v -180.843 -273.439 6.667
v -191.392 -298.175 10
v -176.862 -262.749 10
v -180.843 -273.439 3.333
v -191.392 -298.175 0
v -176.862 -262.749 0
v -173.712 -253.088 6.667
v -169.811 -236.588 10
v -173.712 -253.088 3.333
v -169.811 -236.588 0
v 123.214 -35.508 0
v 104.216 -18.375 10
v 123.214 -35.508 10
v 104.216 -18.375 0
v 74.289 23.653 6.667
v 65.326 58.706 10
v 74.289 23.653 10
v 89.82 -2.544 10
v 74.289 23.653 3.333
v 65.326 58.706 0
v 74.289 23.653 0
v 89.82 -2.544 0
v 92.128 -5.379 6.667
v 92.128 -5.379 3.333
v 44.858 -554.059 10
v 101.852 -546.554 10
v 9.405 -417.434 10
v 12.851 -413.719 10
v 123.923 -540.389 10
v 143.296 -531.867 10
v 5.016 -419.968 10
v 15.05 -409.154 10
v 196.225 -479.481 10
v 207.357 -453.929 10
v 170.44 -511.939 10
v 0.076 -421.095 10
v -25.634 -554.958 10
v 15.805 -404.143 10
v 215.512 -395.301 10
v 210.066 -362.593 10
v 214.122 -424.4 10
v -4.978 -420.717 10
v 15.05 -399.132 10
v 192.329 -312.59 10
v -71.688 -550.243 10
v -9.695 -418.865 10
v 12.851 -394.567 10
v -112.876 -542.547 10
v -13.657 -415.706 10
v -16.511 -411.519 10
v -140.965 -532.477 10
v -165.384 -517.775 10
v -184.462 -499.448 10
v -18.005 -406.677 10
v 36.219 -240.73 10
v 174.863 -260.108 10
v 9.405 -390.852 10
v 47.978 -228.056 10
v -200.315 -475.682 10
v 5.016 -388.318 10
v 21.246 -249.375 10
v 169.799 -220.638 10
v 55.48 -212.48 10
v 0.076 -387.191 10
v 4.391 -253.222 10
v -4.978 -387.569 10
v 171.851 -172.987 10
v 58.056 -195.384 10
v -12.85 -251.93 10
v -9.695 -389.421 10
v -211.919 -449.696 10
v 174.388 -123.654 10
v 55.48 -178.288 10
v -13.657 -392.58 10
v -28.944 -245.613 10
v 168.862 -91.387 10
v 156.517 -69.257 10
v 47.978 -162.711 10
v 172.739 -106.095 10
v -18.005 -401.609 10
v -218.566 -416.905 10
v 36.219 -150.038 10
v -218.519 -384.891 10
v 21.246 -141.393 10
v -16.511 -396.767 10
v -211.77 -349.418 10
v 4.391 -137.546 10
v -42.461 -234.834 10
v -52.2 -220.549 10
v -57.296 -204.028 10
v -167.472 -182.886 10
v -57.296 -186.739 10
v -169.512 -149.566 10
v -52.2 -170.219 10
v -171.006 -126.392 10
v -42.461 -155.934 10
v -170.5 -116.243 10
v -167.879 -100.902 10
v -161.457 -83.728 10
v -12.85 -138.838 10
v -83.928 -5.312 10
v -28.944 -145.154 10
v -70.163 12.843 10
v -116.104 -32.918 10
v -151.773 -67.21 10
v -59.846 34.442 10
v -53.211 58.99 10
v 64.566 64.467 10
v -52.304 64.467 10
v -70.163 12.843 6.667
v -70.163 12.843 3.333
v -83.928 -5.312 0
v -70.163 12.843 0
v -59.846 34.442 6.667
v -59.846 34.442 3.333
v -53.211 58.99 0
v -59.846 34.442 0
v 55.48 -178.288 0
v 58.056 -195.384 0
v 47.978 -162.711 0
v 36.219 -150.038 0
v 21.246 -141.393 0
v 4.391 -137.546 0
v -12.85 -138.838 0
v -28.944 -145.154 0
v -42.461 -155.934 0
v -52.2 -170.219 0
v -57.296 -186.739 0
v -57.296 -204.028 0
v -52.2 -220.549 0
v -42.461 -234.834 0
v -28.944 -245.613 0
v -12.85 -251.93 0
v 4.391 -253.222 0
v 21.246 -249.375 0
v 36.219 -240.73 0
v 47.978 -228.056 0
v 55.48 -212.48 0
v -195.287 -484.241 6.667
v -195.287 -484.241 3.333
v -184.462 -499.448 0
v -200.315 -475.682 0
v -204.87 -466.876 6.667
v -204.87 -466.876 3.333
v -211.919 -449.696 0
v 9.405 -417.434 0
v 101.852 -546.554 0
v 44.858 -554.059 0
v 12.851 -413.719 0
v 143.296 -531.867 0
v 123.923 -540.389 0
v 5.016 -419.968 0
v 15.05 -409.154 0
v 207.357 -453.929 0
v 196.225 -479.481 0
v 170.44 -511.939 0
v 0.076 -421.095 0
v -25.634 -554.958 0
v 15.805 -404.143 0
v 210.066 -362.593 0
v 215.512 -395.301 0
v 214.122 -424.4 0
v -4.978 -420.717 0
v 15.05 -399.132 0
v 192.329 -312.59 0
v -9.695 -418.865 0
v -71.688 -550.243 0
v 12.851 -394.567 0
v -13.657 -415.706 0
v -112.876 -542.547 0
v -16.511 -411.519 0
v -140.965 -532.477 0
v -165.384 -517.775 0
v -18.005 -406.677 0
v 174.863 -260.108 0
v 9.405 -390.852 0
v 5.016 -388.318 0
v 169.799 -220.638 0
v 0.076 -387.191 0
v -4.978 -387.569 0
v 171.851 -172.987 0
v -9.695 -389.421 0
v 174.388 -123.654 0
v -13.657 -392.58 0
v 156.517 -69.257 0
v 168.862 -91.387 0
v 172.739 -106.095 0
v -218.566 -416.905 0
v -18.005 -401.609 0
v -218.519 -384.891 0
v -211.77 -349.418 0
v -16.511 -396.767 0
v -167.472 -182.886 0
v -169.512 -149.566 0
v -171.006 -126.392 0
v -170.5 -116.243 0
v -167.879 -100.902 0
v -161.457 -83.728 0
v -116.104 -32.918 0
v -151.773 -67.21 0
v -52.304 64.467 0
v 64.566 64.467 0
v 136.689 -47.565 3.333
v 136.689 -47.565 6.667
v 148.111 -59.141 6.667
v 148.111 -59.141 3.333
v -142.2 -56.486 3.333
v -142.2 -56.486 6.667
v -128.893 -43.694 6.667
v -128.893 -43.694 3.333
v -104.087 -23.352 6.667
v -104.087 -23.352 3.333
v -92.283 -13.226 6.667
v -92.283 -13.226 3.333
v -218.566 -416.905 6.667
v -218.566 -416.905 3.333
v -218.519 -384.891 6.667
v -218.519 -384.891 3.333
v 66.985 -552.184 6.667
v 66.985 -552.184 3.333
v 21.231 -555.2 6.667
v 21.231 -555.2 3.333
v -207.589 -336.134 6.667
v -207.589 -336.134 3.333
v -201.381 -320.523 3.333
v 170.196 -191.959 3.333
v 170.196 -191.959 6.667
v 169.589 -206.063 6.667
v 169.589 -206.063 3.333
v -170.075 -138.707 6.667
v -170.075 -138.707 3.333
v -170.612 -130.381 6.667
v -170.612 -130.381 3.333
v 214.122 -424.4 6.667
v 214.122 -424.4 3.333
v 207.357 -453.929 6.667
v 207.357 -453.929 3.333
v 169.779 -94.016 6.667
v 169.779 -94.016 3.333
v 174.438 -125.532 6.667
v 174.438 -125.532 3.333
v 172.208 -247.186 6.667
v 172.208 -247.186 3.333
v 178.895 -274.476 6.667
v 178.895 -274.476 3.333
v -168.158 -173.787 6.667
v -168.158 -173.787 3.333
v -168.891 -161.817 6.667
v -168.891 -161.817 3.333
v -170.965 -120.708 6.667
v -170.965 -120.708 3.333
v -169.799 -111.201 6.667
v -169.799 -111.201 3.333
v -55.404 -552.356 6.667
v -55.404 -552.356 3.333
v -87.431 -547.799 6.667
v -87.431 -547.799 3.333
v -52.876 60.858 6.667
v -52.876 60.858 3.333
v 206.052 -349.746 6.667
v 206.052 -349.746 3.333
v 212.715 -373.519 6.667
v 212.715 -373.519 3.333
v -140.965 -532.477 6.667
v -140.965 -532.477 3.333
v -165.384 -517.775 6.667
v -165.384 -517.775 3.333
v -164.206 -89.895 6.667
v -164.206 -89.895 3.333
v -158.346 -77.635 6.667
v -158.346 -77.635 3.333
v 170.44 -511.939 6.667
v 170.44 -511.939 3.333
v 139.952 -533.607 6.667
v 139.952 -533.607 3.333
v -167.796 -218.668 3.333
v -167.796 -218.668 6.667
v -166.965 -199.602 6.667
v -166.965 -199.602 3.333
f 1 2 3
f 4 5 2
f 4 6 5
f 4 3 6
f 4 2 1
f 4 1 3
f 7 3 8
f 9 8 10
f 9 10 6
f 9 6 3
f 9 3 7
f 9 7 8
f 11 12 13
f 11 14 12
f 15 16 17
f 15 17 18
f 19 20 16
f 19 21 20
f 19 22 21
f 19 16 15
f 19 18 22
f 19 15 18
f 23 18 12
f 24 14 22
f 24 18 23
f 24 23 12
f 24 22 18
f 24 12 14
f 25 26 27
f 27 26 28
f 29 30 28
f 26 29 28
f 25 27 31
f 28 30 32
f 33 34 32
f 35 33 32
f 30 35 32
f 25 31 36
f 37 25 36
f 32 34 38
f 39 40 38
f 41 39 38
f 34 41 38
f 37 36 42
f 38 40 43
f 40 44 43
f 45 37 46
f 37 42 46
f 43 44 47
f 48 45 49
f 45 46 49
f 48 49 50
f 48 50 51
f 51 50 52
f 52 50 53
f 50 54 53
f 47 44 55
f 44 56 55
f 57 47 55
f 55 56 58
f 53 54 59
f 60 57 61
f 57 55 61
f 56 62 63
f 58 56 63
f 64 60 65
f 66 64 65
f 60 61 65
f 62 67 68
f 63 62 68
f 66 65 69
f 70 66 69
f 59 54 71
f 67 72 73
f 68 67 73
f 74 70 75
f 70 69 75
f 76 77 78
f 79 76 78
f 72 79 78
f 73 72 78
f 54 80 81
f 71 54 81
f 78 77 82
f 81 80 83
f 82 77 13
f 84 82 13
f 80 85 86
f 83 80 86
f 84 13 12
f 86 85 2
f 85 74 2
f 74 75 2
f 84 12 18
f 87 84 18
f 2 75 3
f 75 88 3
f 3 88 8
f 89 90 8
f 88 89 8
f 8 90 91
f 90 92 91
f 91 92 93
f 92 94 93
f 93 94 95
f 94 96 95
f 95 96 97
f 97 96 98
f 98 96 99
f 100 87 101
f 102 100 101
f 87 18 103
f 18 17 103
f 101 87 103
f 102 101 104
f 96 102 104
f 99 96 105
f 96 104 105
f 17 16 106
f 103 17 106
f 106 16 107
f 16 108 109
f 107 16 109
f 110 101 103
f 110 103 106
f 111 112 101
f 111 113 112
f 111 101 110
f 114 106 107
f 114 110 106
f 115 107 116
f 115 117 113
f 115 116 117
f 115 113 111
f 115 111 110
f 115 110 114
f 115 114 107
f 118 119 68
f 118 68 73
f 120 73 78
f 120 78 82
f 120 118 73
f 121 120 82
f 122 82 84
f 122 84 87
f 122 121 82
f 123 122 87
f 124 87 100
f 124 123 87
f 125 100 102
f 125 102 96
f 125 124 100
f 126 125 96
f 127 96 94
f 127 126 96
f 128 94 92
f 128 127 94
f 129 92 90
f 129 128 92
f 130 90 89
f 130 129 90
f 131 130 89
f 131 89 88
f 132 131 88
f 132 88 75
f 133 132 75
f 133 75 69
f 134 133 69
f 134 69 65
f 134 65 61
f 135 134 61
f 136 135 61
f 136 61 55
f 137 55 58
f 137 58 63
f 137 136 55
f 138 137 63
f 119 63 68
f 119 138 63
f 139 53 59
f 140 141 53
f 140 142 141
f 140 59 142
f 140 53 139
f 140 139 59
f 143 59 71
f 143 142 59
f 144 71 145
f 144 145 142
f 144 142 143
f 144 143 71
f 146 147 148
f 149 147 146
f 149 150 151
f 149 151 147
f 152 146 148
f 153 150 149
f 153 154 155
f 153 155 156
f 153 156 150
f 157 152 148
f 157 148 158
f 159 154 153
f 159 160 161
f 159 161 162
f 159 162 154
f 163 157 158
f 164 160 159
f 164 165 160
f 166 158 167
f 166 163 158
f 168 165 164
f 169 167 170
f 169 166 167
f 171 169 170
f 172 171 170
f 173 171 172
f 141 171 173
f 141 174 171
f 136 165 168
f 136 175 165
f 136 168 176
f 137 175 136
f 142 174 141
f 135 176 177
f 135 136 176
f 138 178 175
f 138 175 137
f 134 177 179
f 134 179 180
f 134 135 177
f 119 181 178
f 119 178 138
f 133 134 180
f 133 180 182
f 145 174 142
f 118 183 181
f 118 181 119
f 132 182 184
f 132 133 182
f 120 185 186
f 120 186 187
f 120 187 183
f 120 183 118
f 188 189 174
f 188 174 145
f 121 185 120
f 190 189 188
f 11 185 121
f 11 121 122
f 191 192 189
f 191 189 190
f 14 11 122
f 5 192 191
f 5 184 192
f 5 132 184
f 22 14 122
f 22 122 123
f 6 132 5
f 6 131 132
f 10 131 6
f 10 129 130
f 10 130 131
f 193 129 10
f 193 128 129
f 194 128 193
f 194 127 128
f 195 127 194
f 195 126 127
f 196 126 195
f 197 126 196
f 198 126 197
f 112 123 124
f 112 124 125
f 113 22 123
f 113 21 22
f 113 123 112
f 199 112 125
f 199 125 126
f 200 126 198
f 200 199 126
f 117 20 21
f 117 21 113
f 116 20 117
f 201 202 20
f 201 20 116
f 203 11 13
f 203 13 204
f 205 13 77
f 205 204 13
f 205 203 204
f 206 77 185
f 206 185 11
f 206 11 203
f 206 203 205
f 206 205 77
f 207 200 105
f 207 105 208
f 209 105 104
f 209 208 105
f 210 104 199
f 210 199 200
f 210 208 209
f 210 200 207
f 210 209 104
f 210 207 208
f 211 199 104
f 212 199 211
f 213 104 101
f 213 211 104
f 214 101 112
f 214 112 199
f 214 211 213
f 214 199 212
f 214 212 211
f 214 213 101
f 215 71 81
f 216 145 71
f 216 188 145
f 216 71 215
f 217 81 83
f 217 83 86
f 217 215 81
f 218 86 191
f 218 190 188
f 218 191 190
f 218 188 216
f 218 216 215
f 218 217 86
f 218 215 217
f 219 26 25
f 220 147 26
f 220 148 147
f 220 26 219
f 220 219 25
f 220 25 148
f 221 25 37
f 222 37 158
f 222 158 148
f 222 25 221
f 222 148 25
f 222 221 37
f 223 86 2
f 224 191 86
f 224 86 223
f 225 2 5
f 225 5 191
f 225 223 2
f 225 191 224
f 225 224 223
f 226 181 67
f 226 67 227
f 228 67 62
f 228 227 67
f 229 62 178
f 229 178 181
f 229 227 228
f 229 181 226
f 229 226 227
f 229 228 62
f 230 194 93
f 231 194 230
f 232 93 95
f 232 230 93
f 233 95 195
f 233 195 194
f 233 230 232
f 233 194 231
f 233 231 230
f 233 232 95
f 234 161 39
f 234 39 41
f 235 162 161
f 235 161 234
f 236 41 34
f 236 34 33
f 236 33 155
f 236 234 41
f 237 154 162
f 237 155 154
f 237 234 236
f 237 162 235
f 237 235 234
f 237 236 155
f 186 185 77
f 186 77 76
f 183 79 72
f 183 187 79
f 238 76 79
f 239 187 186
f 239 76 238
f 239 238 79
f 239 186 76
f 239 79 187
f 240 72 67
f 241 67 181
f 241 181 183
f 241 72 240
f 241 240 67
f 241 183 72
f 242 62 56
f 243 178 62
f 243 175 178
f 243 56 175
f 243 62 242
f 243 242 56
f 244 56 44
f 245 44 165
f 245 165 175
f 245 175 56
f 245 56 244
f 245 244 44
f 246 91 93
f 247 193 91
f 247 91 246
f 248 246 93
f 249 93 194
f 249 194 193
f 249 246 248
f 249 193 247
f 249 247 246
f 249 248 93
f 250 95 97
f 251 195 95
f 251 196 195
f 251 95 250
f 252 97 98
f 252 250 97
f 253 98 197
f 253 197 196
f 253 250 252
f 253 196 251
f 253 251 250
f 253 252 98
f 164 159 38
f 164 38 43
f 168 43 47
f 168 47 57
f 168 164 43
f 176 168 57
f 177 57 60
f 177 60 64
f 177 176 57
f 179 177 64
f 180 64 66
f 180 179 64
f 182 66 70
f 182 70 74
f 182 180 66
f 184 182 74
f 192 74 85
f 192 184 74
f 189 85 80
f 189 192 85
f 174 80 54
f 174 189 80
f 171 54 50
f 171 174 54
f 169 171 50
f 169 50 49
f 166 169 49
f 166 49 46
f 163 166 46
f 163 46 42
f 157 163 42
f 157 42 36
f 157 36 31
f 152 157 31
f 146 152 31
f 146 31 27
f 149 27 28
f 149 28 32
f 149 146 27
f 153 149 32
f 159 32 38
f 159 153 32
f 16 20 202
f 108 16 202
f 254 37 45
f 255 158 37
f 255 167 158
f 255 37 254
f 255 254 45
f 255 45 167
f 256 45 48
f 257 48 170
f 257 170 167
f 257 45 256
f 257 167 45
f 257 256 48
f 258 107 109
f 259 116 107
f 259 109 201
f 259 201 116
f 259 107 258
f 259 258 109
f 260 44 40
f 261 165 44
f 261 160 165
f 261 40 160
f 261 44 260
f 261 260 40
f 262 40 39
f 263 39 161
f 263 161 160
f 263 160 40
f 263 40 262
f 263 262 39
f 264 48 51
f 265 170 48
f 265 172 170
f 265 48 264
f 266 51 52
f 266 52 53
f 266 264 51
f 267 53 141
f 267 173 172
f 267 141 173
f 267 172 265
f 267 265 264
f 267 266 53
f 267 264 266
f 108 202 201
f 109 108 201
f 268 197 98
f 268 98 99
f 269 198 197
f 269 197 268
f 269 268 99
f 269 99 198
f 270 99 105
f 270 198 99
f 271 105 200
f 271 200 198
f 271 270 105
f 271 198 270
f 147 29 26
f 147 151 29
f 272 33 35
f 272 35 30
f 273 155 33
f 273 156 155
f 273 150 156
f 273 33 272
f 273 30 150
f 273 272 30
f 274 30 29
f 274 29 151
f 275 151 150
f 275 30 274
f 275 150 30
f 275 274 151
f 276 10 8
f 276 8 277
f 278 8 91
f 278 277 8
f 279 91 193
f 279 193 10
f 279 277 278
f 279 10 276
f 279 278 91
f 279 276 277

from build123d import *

# Parameters (mm, degrees)
F0_R     = 17
F0_R_2   = 58
F1_DEPTH = 10


with BuildPart() as f1:
    # F0 (on Top) → F1 (new body)
    with BuildSketch(Plane.XY):
        with BuildLine():
            add(Edge.make_bspline(
                [(-25.6339077997, -554.9584652973), (-51.3281857013, -553.7520074813), (-93.6695279871, -547.7281922836), (-112.8758760553, -542.5469908858)],
                knots=[0, 0, 0, 0, 1, 1, 1, 1], degree=3))
            add(Edge.make_bspline(
                [(101.8517638204, -546.5538520712), (75.6875139287, -553.2760310818), (18.5277424792, -557.0443555931), (-25.6339077997, -554.9584652973)],
                knots=[0, 0, 0, 0, 1, 1, 1, 1], degree=3))
            add(Edge.make_bspline(
                [(196.2248278388, -479.4811160712), (171.822081153, -518.0226613149), (144.728786774, -537.2783267828), (101.8517638204, -546.5538520712)],
                knots=[0, 0, 0, 0, 1, 1, 1, 1], degree=3))
            add(Edge.make_bspline(
                [(215.5120574316, -395.3010671859), (217.1466194612, -422.7158916841), (209.2029400354, -457.3865119018), (196.2248278388, -479.4811160712)],
                knots=[0, 0, 0, 0, 1, 1, 1, 1], degree=3))
            add(Edge.make_bspline(
                [(192.3294851646, -312.5904306206), (210.6460825929, -360.2347591492), (213.5839387817, -370.7164733528), (215.5120574316, -395.3010671859)],
                knots=[0, 0, 0, 0, 1, 1, 1, 1], degree=3))
            add(Edge.make_bspline(
                [(169.7994317014, -220.6377759274), (170.8927200615, -250.1742175661), (174.6979485759, -265.704673421), (192.3294851646, -312.5904306206)],
                knots=[0, 0, 0, 0, 1, 1, 1, 1], degree=3))
            add(Edge.make_bspline(
                [(171.8513537255, -172.9866951147), (169.5959356869, -196.170976202), (169.2566540986, -204.0498641717), (169.7994317014, -220.6377759274)],
                knots=[0, 0, 0, 0, 1, 1, 1, 1], degree=3))
            add(Edge.make_bspline(
                [(156.5171346692, -69.2568868796), (174.5323214434, -93.697017447), (177.6080524724, -114.5030664178), (171.8513537255, -172.9866951147)],
                knots=[0, 0, 0, 0, 1, 1, 1, 1], degree=3))
            add(Edge.make_bspline(
                [(123.2144497533, -35.5076734554), (137.3923515164, -47.479706869), (149.9416092694, -60.1972288193), (156.5171346692, -69.2568868796)],
                knots=[0, 0, 0, 0, 1, 1, 1, 1], degree=3))
            add(Edge.make_bspline(
                [(65.3255478686, 58.7055848673), (71.3094857176, 18.2698117865), (84.0455293395, -2.4578782981), (123.2144497533, -35.5076734554)],
                knots=[0, 0, 0, 0, 1, 1, 1, 1], degree=3))
            Line((65.3255478686, 58.7055848673), (64.565721553, 64.4665316539))
            Line((64.565721553, 64.4665316539), (-52.3039117597, 64.4665316539))
            add(Edge.make_bspline(
                [(-53.2111279718, 58.9898998943), (-52.85822859, 60.9062352781), (-52.5589473666, 62.6516212459), (-52.3039117597, 64.4665316539)],
                knots=[0, 0, 0, 0, 0.1687767432, 0.1687767432, 0.1687767432, 0.1687767432], degree=3))
            add(Edge.make_bspline(
                [(-83.9275562826, -5.3117870477), (-68.5191745861, 10.9552480289), (-57.925205972, 33.1326502537), (-53.2111279718, 58.9898998943)],
                knots=[0, 0, 0, 0, 1, 1, 1, 1], degree=3))
            add(Edge.make_bspline(
                [(-116.1044629089, -32.9178178076), (-105.0576364154, -24.5577063166), (-89.4816840216, -11.1943914798), (-83.9275562826, -5.3117870477)],
                knots=[0, 0, 0, 0, 1, 1, 1, 1], degree=3))
            add(Edge.make_bspline(
                [(-151.7732536447, -67.2104688142), (-145.4823496584, -58.8826067666), (-127.2181132715, -41.3230190468), (-116.1044629089, -32.9178178076)],
                knots=[0, 0, 0, 0, 1, 1, 1, 1], degree=3))
            add(Edge.make_bspline(
                [(-167.8786038958, -100.9023919243), (-165.7922728196, -91.5504220926), (-158.2096647421, -75.6878301404), (-151.7732536447, -67.2104688142)],
                knots=[0, 0, 0, 0, 1, 1, 1, 1], degree=3))
            add(Edge.make_bspline(
                [(-171.0060882933, -126.3918295099), (-171.6524429426, -123.6316115462), (-170.0516423645, -110.5848282174), (-167.8786038958, -100.9023919243)],
                knots=[0, 0, 0, 0, 1, 1, 1, 1], degree=3))
            add(Edge.make_bspline(
                [(-169.5117163, -149.5662211718), (-170.0493651796, -138.0408590498), (-170.7218331806, -127.612381277), (-171.0060882933, -126.3918295099)],
                knots=[0, 0, 0, 0, 1, 1, 1, 1], degree=3))
            add(Edge.make_bspline(
                [(-167.471540599, -182.8861909723), (-168.0820735931, -176.0867543832), (-169.0001494598, -161.0927678386), (-169.5117163, -149.5662211718)],
                knots=[0, 0, 0, 0, 1, 1, 1, 1], degree=3))
            add(Edge.make_bspline(
                [(-169.8114988663, -236.5880074419), (-167.2539474938, -220.4051955184), (-166.2455341108, -197.26217001), (-167.471540599, -182.8861909723)],
                knots=[0, 0, 0, 0, 1, 1, 1, 1], degree=3))
            add(Edge.make_bspline(
                [(-191.3924597661, -298.1748905383), (-179.0718659588, -271.0675724162), (-172.1596309655, -251.3416179851), (-169.8114988663, -236.5880074419)],
                knots=[0, 0, 0, 0, 1, 1, 1, 1], degree=3))
            add(Edge.make_bspline(
                [(-211.7698147273, -349.4178452311), (-208.0178282467, -335.8281697152), (-203.8558661958, -325.3620944905), (-191.3924597661, -298.1748905383)],
                knots=[0, 0, 0, 0, 1, 1, 1, 1], degree=3))
            add(Edge.make_bspline(
                [(-211.9194493318, -449.6959373576), (-221.9116183428, -415.102756195), (-221.8712504731, -388.0341277686), (-211.7698147273, -349.4178452311)],
                knots=[0, 0, 0, 0, 1, 1, 1, 1], degree=3))
            add(Edge.make_bspline(
                [(-184.4620737021, -499.4476777279), (-195.4772493714, -486.0997058769), (-206.5682443762, -466.0032882637), (-211.9194493318, -449.6959373576)],
                knots=[0, 0, 0, 0, 1, 1, 1, 1], degree=3))
            add(Edge.make_bspline(
                [(-112.8758760553, -542.5469908858), (-142.243597994, -535.1274441055), (-168.6109492663, -519.252627116), (-184.4620737021, -499.4476777279)],
                knots=[0, 0, 0, 0, 1, 1, 1, 1], degree=3))
        make_face()
        with Locations((-1.1947170427, -404.1430069365)):
            Circle(F0_R, mode=Mode.SUBTRACT)
        with Locations((0.0564528571, -195.3839299387)):
            Circle(F0_R_2, mode=Mode.SUBTRACT)
    extrude(amount=F1_DEPTH)


solid = f1.part
